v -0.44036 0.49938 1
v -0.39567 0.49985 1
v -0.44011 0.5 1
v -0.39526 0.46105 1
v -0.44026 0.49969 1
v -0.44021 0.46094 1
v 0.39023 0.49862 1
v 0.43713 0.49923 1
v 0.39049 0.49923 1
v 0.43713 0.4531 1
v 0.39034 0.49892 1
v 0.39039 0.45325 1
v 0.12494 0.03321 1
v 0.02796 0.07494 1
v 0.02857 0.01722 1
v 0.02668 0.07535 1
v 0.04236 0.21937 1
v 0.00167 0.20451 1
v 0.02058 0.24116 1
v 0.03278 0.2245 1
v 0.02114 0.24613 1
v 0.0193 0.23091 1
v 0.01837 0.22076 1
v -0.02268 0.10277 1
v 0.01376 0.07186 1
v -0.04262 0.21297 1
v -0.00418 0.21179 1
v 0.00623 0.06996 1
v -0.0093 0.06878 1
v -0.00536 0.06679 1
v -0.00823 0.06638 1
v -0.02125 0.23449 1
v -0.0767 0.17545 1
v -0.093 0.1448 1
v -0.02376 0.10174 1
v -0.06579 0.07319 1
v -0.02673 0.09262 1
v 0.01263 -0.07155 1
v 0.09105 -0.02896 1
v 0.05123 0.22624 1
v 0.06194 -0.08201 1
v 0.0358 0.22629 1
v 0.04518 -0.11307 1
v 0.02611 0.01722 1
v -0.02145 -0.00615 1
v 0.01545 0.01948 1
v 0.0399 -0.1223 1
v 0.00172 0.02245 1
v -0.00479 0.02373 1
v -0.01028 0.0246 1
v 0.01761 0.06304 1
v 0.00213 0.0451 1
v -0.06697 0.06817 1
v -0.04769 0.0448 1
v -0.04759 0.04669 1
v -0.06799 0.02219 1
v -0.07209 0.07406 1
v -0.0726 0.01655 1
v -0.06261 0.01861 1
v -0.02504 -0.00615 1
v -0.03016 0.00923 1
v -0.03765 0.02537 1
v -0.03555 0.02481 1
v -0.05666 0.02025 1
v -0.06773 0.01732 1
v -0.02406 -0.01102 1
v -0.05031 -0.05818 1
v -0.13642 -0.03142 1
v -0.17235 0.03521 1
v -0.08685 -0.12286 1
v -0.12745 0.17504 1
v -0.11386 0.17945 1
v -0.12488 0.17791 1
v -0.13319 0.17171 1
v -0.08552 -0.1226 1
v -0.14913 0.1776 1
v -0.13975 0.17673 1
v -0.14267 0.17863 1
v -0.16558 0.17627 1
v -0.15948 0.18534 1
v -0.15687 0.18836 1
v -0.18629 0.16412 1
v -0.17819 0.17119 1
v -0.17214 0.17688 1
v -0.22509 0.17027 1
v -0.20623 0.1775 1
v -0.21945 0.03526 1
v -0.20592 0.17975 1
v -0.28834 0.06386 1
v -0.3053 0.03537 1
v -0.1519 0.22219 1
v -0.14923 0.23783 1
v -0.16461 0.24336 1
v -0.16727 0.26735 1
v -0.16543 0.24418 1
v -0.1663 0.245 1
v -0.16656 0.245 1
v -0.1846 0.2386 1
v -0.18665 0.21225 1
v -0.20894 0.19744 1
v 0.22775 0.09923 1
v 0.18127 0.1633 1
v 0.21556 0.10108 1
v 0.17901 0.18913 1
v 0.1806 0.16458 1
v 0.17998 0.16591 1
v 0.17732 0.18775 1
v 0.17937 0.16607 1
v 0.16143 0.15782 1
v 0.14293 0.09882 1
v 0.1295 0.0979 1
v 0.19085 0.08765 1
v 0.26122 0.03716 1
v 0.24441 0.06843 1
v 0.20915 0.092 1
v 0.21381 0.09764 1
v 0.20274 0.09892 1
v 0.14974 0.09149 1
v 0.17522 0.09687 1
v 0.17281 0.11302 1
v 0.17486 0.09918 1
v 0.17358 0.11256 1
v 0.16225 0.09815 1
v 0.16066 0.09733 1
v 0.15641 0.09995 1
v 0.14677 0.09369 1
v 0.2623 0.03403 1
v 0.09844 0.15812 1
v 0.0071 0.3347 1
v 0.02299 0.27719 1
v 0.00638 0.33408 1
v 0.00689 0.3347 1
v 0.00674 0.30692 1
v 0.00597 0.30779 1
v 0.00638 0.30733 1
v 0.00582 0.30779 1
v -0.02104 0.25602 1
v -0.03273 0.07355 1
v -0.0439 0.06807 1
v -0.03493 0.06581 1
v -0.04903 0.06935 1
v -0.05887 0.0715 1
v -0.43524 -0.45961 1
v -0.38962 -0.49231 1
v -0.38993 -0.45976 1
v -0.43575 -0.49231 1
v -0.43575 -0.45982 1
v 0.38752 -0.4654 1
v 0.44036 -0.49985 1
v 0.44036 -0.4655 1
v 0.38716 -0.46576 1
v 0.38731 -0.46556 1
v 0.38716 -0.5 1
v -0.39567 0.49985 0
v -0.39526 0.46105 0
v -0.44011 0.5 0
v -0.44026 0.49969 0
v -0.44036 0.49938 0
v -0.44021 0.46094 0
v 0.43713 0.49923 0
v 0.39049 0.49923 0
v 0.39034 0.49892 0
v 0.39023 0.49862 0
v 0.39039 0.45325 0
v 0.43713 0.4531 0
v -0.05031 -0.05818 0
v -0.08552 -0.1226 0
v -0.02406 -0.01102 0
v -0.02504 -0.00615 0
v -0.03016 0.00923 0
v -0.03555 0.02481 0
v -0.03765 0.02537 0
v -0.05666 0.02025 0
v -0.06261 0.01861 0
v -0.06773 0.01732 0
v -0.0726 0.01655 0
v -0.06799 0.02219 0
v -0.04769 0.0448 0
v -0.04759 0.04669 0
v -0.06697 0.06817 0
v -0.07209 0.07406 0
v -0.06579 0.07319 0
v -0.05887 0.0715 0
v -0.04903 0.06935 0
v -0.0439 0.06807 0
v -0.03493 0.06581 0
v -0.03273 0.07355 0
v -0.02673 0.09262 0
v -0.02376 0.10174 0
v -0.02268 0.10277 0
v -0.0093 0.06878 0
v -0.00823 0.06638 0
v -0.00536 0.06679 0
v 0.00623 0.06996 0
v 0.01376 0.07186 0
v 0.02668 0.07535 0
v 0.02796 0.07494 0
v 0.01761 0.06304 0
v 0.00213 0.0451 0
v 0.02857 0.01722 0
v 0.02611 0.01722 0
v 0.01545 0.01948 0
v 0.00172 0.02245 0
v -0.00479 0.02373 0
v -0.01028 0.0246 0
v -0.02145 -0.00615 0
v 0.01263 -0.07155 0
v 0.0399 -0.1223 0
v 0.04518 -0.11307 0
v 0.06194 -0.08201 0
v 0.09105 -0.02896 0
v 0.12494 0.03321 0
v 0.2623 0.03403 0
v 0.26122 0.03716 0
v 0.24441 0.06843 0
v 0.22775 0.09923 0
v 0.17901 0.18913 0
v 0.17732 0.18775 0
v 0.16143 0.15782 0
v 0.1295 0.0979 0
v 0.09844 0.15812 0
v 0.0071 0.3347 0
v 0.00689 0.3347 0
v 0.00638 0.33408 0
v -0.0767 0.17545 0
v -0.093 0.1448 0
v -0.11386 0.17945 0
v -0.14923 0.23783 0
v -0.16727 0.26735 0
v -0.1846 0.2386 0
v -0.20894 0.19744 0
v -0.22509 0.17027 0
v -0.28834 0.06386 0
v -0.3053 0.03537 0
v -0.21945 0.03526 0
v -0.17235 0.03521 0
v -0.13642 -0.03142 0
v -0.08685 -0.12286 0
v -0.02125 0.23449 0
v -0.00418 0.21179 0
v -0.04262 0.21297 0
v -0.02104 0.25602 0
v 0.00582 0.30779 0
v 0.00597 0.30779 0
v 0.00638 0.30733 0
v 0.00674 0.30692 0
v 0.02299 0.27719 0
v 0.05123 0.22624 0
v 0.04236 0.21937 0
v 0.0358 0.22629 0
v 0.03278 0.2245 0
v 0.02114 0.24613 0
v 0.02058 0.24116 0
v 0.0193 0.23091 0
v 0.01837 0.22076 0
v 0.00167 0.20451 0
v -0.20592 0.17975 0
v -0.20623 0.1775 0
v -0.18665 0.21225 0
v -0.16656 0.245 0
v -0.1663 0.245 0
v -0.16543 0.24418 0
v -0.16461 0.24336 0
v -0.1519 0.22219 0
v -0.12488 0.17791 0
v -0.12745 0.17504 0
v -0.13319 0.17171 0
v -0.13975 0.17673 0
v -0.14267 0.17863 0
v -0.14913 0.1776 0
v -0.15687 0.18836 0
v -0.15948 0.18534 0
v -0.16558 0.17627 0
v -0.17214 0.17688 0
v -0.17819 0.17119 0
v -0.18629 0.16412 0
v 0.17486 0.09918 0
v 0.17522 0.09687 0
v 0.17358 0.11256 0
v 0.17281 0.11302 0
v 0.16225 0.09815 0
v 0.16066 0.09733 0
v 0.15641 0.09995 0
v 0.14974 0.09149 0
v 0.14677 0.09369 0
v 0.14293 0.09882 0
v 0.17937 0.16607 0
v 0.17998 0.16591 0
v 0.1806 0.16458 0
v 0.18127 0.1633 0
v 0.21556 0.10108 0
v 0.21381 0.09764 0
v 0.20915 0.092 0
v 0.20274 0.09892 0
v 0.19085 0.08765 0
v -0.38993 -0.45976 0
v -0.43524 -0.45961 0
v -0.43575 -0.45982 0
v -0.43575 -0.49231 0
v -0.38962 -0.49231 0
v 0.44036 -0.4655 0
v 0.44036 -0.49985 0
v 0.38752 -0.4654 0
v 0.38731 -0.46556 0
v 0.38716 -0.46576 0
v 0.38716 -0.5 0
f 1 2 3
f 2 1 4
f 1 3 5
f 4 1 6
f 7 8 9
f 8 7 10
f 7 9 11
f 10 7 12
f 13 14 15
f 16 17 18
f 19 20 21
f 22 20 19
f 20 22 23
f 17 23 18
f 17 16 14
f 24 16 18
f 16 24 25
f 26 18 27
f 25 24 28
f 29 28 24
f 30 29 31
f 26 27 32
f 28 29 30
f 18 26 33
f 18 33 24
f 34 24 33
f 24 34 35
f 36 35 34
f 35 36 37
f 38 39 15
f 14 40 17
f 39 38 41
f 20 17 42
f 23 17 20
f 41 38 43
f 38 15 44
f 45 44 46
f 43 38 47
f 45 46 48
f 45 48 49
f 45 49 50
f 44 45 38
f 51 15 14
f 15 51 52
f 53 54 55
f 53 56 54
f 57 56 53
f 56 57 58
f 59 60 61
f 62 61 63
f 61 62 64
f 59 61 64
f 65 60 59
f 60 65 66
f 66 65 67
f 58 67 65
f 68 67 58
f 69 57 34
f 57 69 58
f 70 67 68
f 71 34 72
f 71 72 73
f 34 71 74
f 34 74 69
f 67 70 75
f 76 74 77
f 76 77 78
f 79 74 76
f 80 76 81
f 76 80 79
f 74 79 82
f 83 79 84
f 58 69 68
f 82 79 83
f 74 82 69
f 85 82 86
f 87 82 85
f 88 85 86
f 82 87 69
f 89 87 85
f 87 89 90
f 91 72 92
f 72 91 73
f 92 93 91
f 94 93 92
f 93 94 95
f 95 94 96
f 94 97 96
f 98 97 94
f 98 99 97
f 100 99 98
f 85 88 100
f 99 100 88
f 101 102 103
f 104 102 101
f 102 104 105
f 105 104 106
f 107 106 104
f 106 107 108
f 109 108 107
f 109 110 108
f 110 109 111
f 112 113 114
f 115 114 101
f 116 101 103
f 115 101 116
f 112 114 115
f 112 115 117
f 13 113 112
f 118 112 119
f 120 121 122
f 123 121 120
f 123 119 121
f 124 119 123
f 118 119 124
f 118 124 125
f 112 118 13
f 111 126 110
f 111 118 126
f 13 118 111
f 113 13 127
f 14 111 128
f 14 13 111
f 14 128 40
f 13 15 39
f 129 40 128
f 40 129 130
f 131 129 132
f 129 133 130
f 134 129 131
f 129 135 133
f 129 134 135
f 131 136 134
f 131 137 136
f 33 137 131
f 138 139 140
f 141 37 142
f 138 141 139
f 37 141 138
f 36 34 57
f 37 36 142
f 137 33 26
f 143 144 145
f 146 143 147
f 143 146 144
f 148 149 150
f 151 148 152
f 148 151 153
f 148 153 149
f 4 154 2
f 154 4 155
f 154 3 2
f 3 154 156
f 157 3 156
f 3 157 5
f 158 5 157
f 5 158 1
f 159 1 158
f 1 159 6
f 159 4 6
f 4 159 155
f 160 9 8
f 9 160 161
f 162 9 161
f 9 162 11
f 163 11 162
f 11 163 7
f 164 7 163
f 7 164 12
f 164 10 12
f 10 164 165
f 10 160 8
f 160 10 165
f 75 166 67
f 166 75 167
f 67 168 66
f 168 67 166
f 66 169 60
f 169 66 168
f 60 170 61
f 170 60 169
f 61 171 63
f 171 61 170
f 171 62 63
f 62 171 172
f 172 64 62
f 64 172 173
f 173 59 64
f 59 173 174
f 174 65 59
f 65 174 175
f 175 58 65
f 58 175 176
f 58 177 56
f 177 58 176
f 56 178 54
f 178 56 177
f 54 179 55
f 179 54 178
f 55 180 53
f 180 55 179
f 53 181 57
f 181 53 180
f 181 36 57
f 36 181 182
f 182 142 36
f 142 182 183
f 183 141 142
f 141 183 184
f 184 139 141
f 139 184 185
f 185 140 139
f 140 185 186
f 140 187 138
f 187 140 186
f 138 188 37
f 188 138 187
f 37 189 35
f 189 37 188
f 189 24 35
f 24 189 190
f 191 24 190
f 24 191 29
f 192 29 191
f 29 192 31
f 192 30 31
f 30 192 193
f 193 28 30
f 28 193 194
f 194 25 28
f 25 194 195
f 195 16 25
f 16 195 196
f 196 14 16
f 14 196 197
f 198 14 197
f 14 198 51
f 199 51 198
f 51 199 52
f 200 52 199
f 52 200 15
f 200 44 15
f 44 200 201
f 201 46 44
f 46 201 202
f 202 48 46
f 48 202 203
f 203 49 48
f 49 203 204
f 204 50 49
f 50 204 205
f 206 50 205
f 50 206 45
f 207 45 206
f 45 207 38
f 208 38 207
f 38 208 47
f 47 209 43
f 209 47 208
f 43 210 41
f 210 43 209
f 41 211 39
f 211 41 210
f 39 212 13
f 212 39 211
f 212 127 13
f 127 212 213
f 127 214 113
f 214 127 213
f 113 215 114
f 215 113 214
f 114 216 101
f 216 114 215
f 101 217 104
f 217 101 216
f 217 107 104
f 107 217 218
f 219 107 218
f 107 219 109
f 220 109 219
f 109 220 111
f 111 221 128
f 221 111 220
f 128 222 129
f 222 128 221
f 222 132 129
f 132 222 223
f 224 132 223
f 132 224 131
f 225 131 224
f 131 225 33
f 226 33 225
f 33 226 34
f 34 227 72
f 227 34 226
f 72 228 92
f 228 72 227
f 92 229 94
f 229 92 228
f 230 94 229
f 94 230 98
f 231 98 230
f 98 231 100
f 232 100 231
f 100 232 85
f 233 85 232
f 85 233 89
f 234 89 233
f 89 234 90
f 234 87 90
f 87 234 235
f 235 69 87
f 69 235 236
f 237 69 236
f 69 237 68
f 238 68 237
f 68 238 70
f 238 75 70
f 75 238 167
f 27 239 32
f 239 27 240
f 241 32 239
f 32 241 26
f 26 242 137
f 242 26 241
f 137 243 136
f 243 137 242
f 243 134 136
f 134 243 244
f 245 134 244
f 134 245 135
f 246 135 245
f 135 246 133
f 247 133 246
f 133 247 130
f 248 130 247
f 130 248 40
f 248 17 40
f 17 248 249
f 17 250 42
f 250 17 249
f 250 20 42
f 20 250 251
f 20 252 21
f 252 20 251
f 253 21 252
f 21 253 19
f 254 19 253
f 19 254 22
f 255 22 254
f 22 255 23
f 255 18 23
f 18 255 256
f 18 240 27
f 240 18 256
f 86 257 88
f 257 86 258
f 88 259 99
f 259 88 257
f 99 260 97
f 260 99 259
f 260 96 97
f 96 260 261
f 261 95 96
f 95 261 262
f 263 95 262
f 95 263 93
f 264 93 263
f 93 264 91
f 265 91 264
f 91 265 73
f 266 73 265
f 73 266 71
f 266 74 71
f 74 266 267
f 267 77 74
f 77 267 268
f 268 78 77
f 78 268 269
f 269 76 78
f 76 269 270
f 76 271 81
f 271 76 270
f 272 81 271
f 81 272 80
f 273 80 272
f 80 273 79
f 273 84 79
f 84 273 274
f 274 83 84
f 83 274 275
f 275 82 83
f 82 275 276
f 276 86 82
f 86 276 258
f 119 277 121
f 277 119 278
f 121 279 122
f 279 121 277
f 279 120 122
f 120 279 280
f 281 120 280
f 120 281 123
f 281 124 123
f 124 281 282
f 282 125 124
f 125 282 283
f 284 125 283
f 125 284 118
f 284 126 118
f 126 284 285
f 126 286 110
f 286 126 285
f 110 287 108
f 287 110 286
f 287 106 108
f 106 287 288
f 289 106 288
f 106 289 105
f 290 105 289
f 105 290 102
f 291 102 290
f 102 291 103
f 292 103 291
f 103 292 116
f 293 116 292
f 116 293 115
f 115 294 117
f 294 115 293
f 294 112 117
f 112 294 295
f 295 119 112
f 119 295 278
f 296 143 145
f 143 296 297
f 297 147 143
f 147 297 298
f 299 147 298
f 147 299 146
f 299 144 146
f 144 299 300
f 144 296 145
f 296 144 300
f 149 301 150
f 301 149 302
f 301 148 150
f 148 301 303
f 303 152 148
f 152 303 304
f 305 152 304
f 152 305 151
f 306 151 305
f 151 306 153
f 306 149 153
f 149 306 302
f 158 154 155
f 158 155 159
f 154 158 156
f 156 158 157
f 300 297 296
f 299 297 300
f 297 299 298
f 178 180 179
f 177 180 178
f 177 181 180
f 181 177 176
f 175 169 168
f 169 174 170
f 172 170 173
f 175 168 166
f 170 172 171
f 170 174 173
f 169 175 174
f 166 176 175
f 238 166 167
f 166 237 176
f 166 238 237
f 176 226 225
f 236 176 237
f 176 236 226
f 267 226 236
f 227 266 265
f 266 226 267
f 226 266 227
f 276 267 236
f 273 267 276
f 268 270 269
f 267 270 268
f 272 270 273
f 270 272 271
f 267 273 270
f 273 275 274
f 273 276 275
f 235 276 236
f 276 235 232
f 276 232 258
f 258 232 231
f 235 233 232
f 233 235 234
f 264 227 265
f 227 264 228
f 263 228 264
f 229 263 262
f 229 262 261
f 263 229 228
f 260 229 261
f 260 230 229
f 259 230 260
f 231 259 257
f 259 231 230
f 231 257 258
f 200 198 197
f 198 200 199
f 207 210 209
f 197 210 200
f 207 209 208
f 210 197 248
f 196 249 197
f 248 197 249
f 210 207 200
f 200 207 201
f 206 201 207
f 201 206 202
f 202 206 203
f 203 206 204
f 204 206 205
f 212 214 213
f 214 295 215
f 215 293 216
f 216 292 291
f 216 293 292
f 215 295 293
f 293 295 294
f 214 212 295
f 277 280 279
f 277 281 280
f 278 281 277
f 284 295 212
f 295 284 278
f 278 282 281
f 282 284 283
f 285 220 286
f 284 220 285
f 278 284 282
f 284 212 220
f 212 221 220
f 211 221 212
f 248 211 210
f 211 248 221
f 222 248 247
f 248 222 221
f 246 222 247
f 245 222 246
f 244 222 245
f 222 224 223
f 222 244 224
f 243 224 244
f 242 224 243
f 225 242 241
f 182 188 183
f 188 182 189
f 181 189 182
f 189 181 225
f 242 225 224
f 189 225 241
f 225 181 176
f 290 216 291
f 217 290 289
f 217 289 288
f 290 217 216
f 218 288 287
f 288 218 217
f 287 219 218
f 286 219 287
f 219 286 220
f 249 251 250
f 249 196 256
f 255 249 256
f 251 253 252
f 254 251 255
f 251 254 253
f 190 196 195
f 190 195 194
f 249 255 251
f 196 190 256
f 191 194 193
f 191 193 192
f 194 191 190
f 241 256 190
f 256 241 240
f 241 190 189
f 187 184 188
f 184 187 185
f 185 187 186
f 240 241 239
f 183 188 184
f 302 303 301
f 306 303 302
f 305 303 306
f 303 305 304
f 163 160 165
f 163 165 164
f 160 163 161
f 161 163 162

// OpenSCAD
module WibbyMtn_1()
{
 /* Generated by trace2scad version 20150415
    http://aggregate.org/MAKE/TRACE2SCAD/
    Optimized model has 155/3016 original points
 */
 color([0.5, 0.5, 0.5])
 assign(minx=285) /* polygon minx=285 */
 assign(miny=200) /* polygon miny=200 */
 assign(maxx=17468) /* polygon maxx=17468 */
 assign(maxy=19710) /* polygon maxy=19710 */
 assign(dx=maxx-minx)
 assign(dy=maxy-miny)
 assign(maxd=((dx>dy)?dx:dy))
 scale([1/maxd, 1/maxd, 1])
 translate([-minx-dx/2, -miny-dy/2, 0])
 linear_extrude(height=1, convexity=155)
 union() {
  union() {
   polygon([[287,19704],[285,19698],[288,18948],[1165,18950],[1157,19707],[290,19710]], convexity=6);
   polygon([[16492,19689],[16490,19683],[16493,18798],[17405,18795],[17405,19695],[16495,19695]], convexity=6);
   union() {
    difference() {
     polygon([[9006,16479],[9001,16473],[7380,13378],[7062,12780],[6655,13456],[5965,14595],[5613,15171],[5275,14610],[4800,13807],[4485,13277],[3251,11201],[2920,10645],[4595,10643],[5514,10642],[6215,9342],[7182,7558],[7208,7563],[7895,8820],[8407,9740],[8388,9835],[8288,10135],[8183,10439],[8142,10450],[7771,10350],[7655,10318],[7555,10293],[7460,10278],[7550,10388],[7946,10829],[7948,10866],[7570,11285],[7470,11400],[7593,11383],[7728,11350],[7920,11308],[8020,11283],[8195,11239],[8238,11390],[8355,11762],[8413,11940],[8434,11960],[8695,11297],[8716,11250],[8772,11258],[8998,11320],[9145,11357],[9397,11425],[9422,11417],[9220,11185],[8918,10835],[9434,10291],[9386,10291],[9178,10335],[8910,10393],[8783,10418],[8676,10435],[8458,9835],[9123,8559],[9655,7569],[9758,7749],[10085,8355],[10653,9390],[11314,10603],[13994,10619],[13973,10680],[13645,11290],[13320,11891],[12369,13645],[12336,13618],[12026,13034],[11403,11865],[10797,13040],[9015,16485],[9011,16485]], convexity=25);
     polygon([[9001,15951],[9008,15943],[9325,15363],[9876,14369],[9703,14235],[9575,14370],[9516,14335],[9289,14757],[9278,14660],[9253,14460],[9235,14262],[8909,13945],[8795,14087],[8462,14530],[8045,14110],[8466,14950],[8990,15960],[8993,15960]], convexity=11);
     polygon([[5649,14719],[5665,14703],[5913,14290],[6440,13426],[6390,13370],[6278,13305],[6150,13403],[6093,13440],[5967,13420],[5816,13630],[5765,13571],[5646,13394],[5518,13406],[5400,13295],[5242,13157],[4853,13418],[4859,13462],[5235,14096],[5627,14735],[5632,14735]], convexity=12);
     polygon([[12400,13166],[12413,13141],[13082,11927],[13048,11860],[12957,11750],[12832,11885],[12600,11665],[12295,11845],[12288,11890],[12263,12151],[12248,12160],[12042,11870],[12011,11854],[11928,11905],[11798,11740],[11740,11783],[11665,11883],[12376,13195],[12388,13192]], convexity=13);
    }
   }
   polygon([[380,986],[375,984],[375,350],[1275,350],[1269,985],[385,988]], convexity=6);
   polygon([[16433,872],[16430,868],[16430,200],[17468,203],[17468,873],[16437,875]], convexity=6);
  }
 }
}

module WibbyMtn()
{
 /* all layers combined, scaled to within a 1mm cube */
 scale([1, 1, 1/1])
 difference() {
  union() {
   scale([1,1,2]) translate([0,0,-0.5]) WibbyMtn_1();
  }
  translate([0,0,-2]) cube([2,2,4],center=true);
 }
}
WibbyMtn();
